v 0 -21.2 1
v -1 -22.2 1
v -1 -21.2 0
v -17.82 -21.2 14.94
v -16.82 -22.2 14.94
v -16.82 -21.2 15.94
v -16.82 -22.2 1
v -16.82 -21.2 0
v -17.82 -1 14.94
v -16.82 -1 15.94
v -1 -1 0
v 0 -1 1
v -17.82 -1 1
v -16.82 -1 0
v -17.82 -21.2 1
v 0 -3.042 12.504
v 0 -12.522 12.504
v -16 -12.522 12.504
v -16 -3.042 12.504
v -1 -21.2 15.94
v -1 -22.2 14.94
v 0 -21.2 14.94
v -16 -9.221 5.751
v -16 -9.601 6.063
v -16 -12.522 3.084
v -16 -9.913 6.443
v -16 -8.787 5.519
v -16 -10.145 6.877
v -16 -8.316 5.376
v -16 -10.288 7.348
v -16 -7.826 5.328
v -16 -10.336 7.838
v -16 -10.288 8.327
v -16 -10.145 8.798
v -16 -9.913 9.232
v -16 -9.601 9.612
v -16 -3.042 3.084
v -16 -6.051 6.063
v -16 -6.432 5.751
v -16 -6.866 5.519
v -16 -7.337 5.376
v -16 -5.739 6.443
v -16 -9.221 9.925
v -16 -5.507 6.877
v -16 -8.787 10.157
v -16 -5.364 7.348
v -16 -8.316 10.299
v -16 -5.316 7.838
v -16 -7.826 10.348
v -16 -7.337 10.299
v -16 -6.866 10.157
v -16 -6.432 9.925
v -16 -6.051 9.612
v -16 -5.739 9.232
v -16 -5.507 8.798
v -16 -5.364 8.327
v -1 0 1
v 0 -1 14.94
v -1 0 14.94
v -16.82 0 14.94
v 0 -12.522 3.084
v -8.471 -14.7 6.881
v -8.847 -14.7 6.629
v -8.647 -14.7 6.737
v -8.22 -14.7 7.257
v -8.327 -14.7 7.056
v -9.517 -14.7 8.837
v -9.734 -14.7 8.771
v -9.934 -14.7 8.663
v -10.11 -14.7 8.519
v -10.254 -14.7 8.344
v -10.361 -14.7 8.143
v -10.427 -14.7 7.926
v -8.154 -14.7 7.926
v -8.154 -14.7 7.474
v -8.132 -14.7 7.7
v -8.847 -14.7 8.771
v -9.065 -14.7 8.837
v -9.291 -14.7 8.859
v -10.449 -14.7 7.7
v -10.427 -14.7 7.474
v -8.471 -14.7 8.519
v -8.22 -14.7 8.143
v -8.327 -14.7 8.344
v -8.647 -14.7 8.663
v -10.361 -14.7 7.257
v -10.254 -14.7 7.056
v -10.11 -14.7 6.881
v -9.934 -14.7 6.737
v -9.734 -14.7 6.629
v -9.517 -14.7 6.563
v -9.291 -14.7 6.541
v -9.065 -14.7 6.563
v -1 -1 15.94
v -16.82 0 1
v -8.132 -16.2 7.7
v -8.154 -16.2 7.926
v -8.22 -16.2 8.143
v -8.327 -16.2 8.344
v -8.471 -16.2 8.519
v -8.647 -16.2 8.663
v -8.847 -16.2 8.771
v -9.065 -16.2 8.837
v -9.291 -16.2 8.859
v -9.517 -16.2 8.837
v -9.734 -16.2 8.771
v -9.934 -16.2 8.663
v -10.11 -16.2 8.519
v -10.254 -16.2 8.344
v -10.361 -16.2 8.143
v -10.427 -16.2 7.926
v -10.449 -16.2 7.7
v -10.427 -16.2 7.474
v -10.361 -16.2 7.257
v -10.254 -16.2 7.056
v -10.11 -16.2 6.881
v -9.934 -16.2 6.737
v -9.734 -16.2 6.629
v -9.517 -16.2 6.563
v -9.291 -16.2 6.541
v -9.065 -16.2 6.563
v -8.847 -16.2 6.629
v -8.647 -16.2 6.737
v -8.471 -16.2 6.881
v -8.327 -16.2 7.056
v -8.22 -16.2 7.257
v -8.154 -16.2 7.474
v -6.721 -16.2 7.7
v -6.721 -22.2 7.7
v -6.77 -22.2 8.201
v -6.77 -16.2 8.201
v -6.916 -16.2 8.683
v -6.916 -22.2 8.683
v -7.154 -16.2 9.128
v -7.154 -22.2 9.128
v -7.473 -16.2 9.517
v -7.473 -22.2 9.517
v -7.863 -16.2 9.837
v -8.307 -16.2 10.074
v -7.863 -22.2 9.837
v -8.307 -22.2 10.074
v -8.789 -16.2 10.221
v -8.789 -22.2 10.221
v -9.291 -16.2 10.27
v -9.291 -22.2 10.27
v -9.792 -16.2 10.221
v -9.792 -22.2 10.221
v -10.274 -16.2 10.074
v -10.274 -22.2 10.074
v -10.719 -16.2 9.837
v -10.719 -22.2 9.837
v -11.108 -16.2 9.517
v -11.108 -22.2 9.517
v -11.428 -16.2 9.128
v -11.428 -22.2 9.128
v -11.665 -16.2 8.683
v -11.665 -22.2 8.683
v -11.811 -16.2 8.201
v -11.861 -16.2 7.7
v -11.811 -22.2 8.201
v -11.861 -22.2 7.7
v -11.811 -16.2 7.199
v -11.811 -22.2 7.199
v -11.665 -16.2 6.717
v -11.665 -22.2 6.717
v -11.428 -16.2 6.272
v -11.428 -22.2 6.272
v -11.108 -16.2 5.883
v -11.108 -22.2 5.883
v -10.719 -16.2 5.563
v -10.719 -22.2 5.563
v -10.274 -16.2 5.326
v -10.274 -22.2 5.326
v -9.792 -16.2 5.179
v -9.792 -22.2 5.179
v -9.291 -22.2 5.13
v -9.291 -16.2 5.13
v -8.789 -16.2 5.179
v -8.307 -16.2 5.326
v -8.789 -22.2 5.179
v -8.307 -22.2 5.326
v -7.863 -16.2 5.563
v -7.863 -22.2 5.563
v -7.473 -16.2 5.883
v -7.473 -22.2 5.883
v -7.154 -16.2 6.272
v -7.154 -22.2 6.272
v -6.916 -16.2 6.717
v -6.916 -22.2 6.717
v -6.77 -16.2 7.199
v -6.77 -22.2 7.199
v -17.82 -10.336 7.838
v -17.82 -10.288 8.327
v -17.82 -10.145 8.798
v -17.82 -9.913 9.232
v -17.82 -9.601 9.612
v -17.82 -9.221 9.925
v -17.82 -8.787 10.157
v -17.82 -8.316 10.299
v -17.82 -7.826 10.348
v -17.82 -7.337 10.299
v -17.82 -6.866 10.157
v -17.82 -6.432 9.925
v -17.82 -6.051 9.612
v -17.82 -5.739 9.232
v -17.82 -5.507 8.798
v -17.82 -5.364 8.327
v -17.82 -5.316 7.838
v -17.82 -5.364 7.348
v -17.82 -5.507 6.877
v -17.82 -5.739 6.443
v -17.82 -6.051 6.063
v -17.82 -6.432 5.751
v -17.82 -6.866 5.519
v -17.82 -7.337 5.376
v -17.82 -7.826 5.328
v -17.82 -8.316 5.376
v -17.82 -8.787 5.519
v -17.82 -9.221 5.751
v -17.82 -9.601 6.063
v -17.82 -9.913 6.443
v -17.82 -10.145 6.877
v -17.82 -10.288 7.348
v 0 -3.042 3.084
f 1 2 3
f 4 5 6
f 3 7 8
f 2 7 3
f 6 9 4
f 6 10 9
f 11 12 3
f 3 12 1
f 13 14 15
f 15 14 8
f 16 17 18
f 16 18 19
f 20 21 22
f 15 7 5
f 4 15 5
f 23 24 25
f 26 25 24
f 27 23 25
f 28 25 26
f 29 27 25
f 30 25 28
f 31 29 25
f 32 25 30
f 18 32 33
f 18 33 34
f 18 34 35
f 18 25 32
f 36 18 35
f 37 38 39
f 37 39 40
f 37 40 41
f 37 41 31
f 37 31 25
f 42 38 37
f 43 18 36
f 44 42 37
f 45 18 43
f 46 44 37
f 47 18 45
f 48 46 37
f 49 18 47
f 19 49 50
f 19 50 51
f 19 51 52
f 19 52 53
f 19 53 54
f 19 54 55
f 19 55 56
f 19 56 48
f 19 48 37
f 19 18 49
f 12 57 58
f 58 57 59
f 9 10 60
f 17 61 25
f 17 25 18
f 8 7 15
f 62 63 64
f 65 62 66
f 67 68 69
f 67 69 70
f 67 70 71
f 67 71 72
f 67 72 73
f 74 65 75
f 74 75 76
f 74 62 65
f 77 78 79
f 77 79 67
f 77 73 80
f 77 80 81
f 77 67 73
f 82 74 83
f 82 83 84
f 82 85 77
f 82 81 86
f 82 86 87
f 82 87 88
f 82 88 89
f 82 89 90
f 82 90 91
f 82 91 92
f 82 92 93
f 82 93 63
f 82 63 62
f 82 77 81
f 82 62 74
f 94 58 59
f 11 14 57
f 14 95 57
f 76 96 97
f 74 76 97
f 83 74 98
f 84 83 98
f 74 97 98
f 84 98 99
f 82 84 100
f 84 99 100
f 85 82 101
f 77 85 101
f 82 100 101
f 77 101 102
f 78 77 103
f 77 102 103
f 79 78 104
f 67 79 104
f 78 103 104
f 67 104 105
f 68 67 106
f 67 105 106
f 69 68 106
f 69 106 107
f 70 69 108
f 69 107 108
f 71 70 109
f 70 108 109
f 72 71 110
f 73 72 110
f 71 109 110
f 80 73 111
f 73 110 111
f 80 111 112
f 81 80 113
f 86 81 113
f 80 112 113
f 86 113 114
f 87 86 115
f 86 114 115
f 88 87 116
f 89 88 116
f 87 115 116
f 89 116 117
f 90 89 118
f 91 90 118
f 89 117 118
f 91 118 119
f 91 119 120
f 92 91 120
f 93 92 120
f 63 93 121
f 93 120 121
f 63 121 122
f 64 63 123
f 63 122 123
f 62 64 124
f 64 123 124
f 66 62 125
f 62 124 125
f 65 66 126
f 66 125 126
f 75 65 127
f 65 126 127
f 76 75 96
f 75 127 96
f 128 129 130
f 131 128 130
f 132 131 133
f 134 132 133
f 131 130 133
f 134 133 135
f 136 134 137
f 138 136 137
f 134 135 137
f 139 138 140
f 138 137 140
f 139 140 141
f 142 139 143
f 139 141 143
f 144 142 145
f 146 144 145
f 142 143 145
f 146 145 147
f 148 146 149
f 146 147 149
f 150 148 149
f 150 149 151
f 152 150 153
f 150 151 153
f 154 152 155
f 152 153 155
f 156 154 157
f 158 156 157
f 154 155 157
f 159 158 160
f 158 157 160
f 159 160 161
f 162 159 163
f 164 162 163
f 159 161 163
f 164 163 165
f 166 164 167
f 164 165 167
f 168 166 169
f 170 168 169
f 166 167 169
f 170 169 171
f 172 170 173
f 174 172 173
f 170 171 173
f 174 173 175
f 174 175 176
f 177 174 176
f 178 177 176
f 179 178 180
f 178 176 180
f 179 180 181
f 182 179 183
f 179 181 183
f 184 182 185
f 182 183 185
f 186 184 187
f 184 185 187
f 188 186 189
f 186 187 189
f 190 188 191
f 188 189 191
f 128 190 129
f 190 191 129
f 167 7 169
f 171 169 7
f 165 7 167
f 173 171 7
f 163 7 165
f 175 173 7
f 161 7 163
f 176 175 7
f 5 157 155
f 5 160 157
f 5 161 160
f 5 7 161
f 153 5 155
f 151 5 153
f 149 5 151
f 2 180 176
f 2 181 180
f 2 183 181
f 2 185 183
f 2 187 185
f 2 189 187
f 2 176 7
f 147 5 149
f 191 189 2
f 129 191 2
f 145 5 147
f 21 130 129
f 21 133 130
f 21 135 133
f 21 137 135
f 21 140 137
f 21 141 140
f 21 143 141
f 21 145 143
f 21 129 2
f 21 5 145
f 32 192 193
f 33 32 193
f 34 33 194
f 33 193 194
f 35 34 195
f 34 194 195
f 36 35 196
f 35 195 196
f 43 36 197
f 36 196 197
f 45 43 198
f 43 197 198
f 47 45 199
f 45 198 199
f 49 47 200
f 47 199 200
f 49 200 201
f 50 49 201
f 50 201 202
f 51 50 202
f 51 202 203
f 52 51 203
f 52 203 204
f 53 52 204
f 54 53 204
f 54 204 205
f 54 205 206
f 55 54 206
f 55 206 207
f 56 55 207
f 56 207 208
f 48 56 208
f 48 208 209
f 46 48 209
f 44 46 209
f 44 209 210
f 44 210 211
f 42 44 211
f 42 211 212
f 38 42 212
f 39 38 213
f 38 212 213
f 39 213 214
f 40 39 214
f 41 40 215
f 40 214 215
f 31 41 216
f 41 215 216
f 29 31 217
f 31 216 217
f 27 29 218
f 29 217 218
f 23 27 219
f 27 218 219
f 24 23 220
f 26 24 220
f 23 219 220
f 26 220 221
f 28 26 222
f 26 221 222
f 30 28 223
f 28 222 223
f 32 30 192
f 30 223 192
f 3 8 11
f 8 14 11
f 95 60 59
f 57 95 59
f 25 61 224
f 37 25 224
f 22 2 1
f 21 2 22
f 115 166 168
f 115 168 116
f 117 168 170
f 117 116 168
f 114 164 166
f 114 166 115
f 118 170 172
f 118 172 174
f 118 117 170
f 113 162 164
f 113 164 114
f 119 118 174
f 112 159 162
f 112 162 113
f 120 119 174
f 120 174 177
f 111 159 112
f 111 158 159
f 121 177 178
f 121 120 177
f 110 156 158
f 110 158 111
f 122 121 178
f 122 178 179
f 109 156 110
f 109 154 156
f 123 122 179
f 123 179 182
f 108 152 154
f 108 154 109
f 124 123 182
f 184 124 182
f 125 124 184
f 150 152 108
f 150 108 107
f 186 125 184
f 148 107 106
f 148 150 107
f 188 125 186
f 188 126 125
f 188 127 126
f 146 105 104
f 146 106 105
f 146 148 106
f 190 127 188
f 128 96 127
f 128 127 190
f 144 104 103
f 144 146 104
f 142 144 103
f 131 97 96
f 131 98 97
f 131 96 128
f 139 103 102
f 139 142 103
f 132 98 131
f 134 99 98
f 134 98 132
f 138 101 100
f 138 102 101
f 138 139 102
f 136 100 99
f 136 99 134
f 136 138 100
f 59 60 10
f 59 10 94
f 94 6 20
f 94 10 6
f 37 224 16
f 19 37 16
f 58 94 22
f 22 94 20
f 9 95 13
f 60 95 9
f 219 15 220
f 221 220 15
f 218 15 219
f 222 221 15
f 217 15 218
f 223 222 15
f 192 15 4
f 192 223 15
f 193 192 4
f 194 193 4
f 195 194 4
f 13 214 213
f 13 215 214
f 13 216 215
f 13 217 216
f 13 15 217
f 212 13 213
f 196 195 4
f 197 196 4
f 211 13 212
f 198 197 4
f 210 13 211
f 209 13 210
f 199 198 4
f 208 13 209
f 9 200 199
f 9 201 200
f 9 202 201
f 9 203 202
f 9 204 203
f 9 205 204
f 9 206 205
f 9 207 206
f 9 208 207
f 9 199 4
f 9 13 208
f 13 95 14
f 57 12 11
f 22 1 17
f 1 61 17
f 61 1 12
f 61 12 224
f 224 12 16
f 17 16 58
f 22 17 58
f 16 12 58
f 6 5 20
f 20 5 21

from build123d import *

# Parameters (mm, degrees)
F0_W      = 17.82
F0_H      = 15.94
F1_DEPTH  = 22.2
F2_SIZE2  = 1
F2_SIZE   = 1
F3_W      = 9.48
F3_H      = 9.42
F4_DEPTH  = 16
F5_R      = 2.51
F6_DEPTH  = 25
F7_R      = 2.57
F8_DEPTH  = 6
F9_R      = 1.158766
F10_DEPTH = 1.5


with BuildPart() as f1:
    # F0 (on Front) → F1 (new body)
    with BuildSketch(Plane.XZ):
        with Locations((-8.91, 7.97)):
            Rectangle(F0_W, F0_H)
    extrude(amount=F1_DEPTH)

    # F2
    f2_edges = [f1.edges().sort_by_distance(p)[0] for p in [
        (-8.91, -22.2, 0),
        (0, -22.2, 7.97),
        (-8.91, -22.2, 15.94),
        (-17.82, -22.2, 7.97),
        (0, -11.1, 0),
        (0, -11.1, 15.94),
        (0, 0, 7.97),
        (-17.82, -11.1, 15.94),
        (-8.91, 0, 15.94),
        (-8.91, 0, 0),
        (-17.82, 0, 7.97),
        (-17.82, -11.1, 0),
    ]]
    chamfer(f2_edges, length=F2_SIZE, length2=F2_SIZE2)

    # F3 (on face) → F4 (cut)
    with BuildSketch(Plane.YZ):
        with Locations((-7.782405, 7.794221)):
            Rectangle(F3_W, F3_H)
    extrude(amount=-F4_DEPTH, mode=Mode.SUBTRACT)

    # F5 (on face) → F6 (cut)
    with BuildSketch(Plane(origin=(-17.82, 0, 0), x_dir=(0, -1, 0), z_dir=(-1, 0, 0))):
        with Locations((7.826266, 7.837604)):
            Circle(F5_R)
    extrude(amount=-F6_DEPTH, mode=Mode.SUBTRACT)

    # F7 (on face) → F8 (cut)
    with BuildSketch(Plane.XZ.offset(22.2)):
        with Locations((-9.29072, 7.7)):
            Circle(F7_R)
    extrude(amount=-F8_DEPTH, mode=Mode.SUBTRACT)

    # F9 (on face) → F10 (cut)
    with BuildSketch(Plane.XZ.offset(16.2)):
        with Locations((-9.29072, 7.7)):
            Circle(F9_R)
    extrude(amount=-F10_DEPTH, mode=Mode.SUBTRACT)


solid = f1.part
